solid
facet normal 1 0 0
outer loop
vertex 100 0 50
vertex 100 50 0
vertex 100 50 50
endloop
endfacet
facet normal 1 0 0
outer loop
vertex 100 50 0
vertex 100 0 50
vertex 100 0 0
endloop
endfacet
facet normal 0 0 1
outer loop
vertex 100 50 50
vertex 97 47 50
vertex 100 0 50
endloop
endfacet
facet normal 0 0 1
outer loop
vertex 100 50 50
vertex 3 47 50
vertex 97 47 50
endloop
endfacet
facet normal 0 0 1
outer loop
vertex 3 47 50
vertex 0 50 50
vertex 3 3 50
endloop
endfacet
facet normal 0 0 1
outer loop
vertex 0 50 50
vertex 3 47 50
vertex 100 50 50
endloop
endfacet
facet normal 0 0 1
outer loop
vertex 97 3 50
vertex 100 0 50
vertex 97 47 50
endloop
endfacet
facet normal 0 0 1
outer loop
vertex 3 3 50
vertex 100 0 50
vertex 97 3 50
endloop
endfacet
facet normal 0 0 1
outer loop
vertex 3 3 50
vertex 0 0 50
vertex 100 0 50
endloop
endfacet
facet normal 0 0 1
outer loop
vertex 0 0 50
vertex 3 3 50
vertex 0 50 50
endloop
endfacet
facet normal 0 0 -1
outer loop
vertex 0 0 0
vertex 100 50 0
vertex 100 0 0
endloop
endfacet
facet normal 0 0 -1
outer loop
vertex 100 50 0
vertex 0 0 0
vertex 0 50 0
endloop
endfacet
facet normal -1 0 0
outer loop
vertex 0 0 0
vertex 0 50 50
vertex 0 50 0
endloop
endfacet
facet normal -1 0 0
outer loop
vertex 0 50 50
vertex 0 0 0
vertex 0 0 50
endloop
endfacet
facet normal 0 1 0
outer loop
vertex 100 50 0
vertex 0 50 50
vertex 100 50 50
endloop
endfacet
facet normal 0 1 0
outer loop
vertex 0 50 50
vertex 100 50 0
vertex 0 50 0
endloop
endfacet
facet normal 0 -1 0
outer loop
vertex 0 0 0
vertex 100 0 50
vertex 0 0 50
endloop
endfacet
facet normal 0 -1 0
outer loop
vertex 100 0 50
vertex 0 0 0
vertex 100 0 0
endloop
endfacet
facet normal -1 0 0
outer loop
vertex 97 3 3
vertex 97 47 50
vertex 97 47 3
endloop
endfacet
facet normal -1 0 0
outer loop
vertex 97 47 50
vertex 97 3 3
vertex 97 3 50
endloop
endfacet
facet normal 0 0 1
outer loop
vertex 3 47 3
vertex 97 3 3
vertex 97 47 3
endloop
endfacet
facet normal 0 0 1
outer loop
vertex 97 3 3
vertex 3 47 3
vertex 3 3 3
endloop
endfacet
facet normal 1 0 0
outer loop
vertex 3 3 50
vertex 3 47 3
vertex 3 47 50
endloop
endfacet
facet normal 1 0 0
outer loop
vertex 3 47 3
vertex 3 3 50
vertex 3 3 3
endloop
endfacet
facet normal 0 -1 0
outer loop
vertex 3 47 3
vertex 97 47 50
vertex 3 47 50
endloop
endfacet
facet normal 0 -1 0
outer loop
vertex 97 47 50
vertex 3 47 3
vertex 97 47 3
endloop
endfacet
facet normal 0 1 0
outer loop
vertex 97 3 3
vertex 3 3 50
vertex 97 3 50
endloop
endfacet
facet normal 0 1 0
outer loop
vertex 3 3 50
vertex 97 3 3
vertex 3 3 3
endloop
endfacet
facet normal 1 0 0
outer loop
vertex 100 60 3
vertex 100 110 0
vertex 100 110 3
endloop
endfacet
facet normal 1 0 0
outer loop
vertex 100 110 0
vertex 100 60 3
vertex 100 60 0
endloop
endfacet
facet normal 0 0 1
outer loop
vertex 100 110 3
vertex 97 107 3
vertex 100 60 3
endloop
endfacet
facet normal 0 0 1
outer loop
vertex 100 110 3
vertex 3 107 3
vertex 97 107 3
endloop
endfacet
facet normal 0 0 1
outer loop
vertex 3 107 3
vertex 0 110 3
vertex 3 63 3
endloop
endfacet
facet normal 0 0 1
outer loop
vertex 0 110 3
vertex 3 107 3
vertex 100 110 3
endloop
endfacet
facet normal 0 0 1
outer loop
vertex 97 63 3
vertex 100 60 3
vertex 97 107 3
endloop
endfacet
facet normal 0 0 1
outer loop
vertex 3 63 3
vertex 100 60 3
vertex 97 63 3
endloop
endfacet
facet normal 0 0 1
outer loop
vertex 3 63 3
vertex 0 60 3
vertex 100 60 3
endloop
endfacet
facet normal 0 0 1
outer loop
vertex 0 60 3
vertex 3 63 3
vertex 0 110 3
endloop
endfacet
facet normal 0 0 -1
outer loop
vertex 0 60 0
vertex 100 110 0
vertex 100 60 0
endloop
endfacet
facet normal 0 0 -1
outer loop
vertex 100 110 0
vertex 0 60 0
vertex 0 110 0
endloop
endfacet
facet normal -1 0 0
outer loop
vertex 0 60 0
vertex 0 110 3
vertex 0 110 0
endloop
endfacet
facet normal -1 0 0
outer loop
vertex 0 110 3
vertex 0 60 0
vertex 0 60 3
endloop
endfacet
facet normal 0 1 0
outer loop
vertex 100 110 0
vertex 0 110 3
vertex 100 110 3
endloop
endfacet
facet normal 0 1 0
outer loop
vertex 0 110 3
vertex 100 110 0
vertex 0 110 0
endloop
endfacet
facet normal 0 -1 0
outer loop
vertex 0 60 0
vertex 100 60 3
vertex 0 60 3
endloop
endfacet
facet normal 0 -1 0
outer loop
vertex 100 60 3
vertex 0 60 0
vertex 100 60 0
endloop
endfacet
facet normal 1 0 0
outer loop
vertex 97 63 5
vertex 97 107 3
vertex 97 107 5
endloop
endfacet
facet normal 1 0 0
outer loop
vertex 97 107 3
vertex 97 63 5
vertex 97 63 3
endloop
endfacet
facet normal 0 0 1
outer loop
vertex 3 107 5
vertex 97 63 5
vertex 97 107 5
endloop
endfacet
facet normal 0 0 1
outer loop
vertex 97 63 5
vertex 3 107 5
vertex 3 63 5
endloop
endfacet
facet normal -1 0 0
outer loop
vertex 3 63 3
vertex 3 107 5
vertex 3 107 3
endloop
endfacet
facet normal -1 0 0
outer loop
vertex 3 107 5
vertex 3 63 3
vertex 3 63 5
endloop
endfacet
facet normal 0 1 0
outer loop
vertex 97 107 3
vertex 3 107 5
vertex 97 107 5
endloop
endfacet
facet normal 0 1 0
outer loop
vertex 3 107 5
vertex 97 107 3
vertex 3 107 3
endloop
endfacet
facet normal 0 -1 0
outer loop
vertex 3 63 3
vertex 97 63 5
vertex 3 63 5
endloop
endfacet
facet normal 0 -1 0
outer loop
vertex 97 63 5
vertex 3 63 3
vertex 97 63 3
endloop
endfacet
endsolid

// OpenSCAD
Length  =   100;//X axis
Width   =   50; //Y
Height  =   50; //Z
Wall    =   3; //Wall thickness

//Box
difference(){
    cube([Length,Width,Height]);
    
    translate([Wall,Wall,Wall]){ //move to the inside of the box
        cube([Length-(Wall*2),Width-(Wall*2),Height]);
    }
}

//Top
translate([0,Width+10,0]){
union(){
    cube([Length,Width,Wall]);
    
    translate([Wall,Wall,0]){ //move to the inside of the box
        cube([Length-(Wall*2),Width-(Wall*2),Wall+2]);
    }
}}
